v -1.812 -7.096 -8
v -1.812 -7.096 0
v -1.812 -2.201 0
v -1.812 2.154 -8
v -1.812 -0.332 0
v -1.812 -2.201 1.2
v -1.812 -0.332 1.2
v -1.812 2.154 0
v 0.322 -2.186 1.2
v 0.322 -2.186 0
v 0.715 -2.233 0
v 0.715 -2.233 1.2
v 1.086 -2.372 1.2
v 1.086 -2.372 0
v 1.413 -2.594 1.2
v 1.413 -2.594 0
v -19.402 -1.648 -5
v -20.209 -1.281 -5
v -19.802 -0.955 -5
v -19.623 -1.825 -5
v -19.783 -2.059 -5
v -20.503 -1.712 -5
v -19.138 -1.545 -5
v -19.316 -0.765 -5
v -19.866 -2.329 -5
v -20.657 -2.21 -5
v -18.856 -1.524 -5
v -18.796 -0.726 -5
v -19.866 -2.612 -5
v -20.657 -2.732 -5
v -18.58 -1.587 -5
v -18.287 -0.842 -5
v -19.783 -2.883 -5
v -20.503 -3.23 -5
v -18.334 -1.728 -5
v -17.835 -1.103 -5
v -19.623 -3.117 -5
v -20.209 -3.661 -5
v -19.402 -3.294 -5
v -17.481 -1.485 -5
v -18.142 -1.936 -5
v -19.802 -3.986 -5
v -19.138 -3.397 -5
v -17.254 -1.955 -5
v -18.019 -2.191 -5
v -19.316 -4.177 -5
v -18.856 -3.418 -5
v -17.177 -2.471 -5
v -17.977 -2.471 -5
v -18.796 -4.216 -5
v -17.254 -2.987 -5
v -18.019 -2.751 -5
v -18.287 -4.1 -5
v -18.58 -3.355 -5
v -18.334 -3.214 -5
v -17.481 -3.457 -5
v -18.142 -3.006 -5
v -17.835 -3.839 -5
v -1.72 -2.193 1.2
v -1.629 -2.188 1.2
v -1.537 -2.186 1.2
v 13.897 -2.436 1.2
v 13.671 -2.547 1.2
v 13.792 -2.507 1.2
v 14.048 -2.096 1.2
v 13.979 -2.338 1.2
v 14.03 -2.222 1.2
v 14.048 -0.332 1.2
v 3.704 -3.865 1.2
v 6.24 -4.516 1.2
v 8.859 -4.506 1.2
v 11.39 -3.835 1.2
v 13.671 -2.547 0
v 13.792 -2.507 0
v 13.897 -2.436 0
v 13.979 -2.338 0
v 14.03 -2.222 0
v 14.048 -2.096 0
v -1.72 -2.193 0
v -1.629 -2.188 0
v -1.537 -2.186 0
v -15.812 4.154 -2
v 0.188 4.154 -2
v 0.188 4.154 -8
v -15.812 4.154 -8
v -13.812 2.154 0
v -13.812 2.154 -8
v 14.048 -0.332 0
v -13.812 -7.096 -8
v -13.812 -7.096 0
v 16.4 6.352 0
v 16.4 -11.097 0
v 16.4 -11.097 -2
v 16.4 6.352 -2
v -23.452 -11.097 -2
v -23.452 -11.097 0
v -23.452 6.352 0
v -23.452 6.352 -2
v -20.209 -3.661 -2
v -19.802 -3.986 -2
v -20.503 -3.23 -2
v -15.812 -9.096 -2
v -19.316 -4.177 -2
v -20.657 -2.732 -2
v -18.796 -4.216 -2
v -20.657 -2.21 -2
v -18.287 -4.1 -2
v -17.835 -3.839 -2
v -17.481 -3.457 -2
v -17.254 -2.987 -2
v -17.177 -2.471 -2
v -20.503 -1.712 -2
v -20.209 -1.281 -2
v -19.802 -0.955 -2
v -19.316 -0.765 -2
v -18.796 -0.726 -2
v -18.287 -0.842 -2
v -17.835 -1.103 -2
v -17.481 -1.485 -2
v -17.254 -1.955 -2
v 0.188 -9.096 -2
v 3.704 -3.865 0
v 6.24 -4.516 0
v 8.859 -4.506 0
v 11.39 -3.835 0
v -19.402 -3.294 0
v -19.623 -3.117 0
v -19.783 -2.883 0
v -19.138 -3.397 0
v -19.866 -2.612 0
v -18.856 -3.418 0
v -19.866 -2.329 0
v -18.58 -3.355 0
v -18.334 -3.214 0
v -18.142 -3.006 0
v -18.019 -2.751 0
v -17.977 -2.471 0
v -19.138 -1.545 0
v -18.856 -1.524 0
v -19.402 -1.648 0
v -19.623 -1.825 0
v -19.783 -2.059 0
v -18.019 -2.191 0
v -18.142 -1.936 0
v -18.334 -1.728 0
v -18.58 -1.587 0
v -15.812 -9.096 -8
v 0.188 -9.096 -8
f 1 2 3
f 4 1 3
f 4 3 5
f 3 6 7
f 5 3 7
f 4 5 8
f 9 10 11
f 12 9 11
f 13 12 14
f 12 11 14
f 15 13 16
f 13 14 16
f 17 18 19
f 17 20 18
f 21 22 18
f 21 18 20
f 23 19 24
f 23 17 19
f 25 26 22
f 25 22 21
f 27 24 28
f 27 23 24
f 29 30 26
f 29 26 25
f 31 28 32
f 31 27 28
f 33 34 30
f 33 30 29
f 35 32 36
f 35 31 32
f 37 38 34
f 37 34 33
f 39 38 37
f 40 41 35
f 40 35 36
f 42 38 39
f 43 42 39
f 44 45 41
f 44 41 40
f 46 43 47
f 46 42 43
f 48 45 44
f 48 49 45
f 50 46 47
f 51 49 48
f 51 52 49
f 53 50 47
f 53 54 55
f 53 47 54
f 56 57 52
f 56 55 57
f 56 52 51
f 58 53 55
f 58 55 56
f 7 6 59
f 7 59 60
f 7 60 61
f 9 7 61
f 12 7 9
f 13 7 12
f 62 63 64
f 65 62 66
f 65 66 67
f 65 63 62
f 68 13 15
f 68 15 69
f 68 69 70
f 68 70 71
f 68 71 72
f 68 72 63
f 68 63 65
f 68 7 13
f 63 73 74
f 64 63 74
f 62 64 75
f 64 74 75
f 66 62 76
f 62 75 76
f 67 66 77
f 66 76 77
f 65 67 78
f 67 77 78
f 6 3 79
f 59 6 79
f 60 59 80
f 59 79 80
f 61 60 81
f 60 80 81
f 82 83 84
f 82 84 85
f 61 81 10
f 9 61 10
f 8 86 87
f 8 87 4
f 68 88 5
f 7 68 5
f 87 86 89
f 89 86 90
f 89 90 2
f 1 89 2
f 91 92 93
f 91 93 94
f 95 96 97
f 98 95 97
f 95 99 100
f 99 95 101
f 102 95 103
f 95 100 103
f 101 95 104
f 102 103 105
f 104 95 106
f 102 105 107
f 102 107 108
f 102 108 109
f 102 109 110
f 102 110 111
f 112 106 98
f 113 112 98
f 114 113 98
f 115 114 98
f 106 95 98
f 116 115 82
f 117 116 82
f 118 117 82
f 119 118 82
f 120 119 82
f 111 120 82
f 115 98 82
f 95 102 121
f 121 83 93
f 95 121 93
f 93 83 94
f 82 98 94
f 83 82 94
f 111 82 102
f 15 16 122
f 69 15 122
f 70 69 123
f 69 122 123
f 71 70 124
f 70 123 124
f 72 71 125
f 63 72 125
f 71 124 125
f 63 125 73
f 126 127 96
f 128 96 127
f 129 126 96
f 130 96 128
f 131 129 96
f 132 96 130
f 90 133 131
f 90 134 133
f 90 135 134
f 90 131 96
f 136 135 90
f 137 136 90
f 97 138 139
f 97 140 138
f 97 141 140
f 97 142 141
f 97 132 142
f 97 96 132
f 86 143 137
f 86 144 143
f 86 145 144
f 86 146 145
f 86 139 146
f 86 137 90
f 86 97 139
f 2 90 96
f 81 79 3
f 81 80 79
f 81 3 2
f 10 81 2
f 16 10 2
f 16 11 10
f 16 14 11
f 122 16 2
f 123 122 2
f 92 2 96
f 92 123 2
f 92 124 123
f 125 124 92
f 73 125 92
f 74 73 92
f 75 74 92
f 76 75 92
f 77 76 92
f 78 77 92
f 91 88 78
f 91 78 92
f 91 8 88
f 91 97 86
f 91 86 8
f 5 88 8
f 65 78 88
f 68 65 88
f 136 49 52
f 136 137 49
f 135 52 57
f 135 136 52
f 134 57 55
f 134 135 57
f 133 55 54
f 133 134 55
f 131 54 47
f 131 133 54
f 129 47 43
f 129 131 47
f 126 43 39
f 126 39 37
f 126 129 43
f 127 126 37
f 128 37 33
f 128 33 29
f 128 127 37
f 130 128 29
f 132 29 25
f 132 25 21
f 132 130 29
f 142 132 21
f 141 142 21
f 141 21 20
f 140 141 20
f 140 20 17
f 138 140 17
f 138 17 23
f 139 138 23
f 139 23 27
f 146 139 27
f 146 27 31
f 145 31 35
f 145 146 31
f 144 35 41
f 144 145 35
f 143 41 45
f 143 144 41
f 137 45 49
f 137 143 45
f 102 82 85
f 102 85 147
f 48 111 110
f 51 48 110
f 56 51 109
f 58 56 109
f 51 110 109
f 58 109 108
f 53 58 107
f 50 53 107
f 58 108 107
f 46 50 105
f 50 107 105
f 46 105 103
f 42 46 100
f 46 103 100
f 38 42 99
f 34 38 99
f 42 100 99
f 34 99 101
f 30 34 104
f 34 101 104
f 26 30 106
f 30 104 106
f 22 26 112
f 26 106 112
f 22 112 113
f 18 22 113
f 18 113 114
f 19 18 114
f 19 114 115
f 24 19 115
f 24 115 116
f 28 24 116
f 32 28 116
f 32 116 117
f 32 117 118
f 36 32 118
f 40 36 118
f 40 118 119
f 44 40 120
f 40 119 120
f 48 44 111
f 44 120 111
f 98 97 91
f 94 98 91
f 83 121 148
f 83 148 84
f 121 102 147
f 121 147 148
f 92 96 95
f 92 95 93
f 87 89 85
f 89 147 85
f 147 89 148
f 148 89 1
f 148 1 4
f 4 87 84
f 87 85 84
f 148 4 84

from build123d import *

# Parameters (mm, degrees)
F1_W     = 39.8526769131
F1_H     = 17.4496416003
F1_W_2   = 12
F1_H_2   = 2.154154708
F1_H_3   = 0.3318400184
F1_W_3   = 0.2365358905
F1_H_4   = 3.9093678362
F1_W_4   = 2
F2_DEPTH = 2
F3_DEPTH = 8
F4_DEPTH = 1.2
F5_DEPTH = 12.5
F6_R     = 0.95
F7_DEPTH = 8.001
F8_R     = 1.75
F8_R_2   = 0.95
F9_DEPTH = 3


with BuildPart() as f2:
    # F1 (on Top) → F2 (new body)
    with BuildSketch(Plane.XY):
        with Locations((-3.525945358, -2.3725284263)):
            Rectangle(F1_W, F1_H)
        with BuildLine():
            Line((0.3216254651, -2.5177070959), (0.1883759089, -2.5177070959))
            Line((0.1883759089, -2.5177070959), (0.1883759089, -9.095845292))
            Line((0.1883759089, -9.095845292), (-15.8116240911, -9.095845292))
            Line((-15.8116240911, -9.095845292), (-15.8116240911, 4.154154708))
            Line((-15.8116240911, 4.154154708), (0.1883759089, 4.154154708))
            Line((0.1883759089, 4.154154708), (0.1883759089, 0))
            Line((0.1883759089, 0), (14.38, 0))
            Line((14.38, 0), (14.38, -2.0960352984))
            ThreePointArc((14.38, -2.0960352984), (14.222994373, -2.5685374355), (13.8144247375, -2.8531070921))
            ThreePointArc((13.8144247375, -2.8531070921), (7.5097918652, -4.9262625681), (1.2051589929, -2.8531070921))
            ThreePointArc((1.2051589929, -2.8531070921), (0.7941518274, -2.6043780637), (0.3216254651, -2.5177070959))
        make_face(mode=Mode.SUBTRACT)
        with BuildLine():
            Line((-1.8116240911, -2.5356413379), (-1.8116240911, -7.095845292))
            Line((-1.8116240911, -7.095845292), (-13.8116240911, -7.095845292))
            Line((-13.8116240911, -7.095845292), (-13.8116240911, -4.573047873))
            Line((-13.8116240911, -4.573047873), (-14.38, -4.573047873))
            Line((-14.38, -4.573047873), (-14.38, 0))
            Line((-14.38, 0), (-13.8116240911, 0))
            Line((-13.8116240911, 0), (-13.8116240911, 2.154154708))
            Line((-13.8116240911, 2.154154708), (-1.8116240911, 2.154154708))
            Line((-1.8116240911, 2.154154708), (-1.8116240911, 0))
            Line((-1.8116240911, 0), (0.1883759089, 0))
            Line((0.1883759089, 0), (0.1883759089, 4.154154708))
            Line((0.1883759089, 4.154154708), (-15.8116240911, 4.154154708))
            Line((-15.8116240911, 4.154154708), (-15.8116240911, -9.095845292))
            Line((-15.8116240911, -9.095845292), (0.1883759089, -9.095845292))
            Line((0.1883759089, -9.095845292), (0.1883759089, -2.5177070959))
            Line((0.1883759089, -2.5177070959), (-1.5371447255, -2.5177070959))
            ThreePointArc((-1.5371447255, -2.5177070959), (-1.6746770482, -2.5221954315), (-1.8116240911, -2.5356413379))
        make_face()
        with BuildLine():
            Line((14.0481599816, -0.3318400184), (0.1883759089, -0.3318400184))
            Line((0.1883759089, -0.3318400184), (0.1883759089, -2.1858670775))
            Line((0.1883759089, -2.1858670775), (0.3216254651, -2.1858670775))
            ThreePointArc((0.3216254651, -2.1858670775), (0.9044684669, -2.2913304213), (1.4133986427, -2.5943461929))
            ThreePointArc((1.4133986427, -2.5943461929), (7.5498522098, -4.5943445782), (13.6705491966, -2.5466326064))
            ThreePointArc((13.6705491966, -2.5466326064), (13.9412759396, -2.389985906), (14.0481599816, -2.0960352984))
            Line((14.0481599816, -2.0960352984), (14.0481599816, -0.3318400184))
        make_face()
        with BuildLine():
            ThreePointArc((-2.9008357147, -2.6022639059), (-2.3804028006, -2.3361323861), (-1.8116240911, -2.201346691))
            Line((-1.8116240911, -2.201346691), (-1.8116240911, -0.3318400184))
            Line((-1.8116240911, -0.3318400184), (-13.8116240911, -0.3318400184))
            Line((-13.8116240911, -0.3318400184), (-13.8116240911, -4.2412078546))
            Line((-13.8116240911, -4.2412078546), (-4.8014899445, -4.2412078546))
            ThreePointArc((-4.8014899445, -4.2412078546), (-4.372916478, -4.1227433058), (-4.0660275776, -3.8009852162))
            Line((-4.0660275776, -3.8009852162), (-2.9008357147, -2.6022639059))
        make_face()
        with BuildLine():
            Line((-13.8116240911, -7.095845292), (-1.8116240911, -7.095845292))
            Line((-1.8116240911, -7.095845292), (-1.8116240911, -2.5356413379))
            ThreePointArc((-1.8116240911, -2.5356413379), (-2.267834406, -2.6483049616), (-2.687782017, -2.8591720937))
            Line((-2.687782017, -2.8591720937), (-4.1783316179, -4.3926136046))
            ThreePointArc((-4.1783316179, -4.3926136046), (-4.4771125311, -4.5270315227), (-4.8014899445, -4.573047873))
            Line((-4.8014899445, -4.573047873), (-13.8116240911, -4.573047873))
            Line((-13.8116240911, -4.573047873), (-13.8116240911, -7.095845292))
        make_face()
        with Locations((-7.8116240911, 1.077077354)):
            Rectangle(F1_W_2, F1_H_2)
        with BuildLine():
            Line((0.1883759089, -2.1858670775), (0.1883759089, -2.5177070959))
            Line((0.1883759089, -2.5177070959), (0.3216254651, -2.5177070959))
            ThreePointArc((0.3216254651, -2.5177070959), (0.7941518274, -2.6043780637), (1.2051589929, -2.8531070921))
            ThreePointArc((1.2051589929, -2.8531070921), (7.5097918652, -4.9262625681), (13.8144247375, -2.8531070921))
            ThreePointArc((13.8144247375, -2.8531070921), (14.222994373, -2.5685374355), (14.38, -2.0960352984))
            Line((14.38, -2.0960352984), (14.38, 0))
            Line((14.38, 0), (0.1883759089, 0))
            Line((0.1883759089, 0), (0.1883759089, -0.3318400184))
            Line((0.1883759089, -0.3318400184), (14.0481599816, -0.3318400184))
            Line((14.0481599816, -0.3318400184), (14.0481599816, -2.0960352984))
            ThreePointArc((14.0481599816, -2.0960352984), (13.9412759396, -2.389985906), (13.6705491966, -2.5466326064))
            ThreePointArc((13.6705491966, -2.5466326064), (7.5498522098, -4.5943445782), (1.4133986427, -2.5943461929))
            ThreePointArc((1.4133986427, -2.5943461929), (0.9044684669, -2.2913304213), (0.3216254651, -2.1858670775))
            Line((0.3216254651, -2.1858670775), (0.1883759089, -2.1858670775))
        make_face()
        with BuildLine():
            ThreePointArc((-2.687782017, -2.8591720937), (-2.267834406, -2.6483049616), (-1.8116240911, -2.5356413379))
            Line((-1.8116240911, -2.5356413379), (-1.8116240911, -2.201346691))
            ThreePointArc((-1.8116240911, -2.201346691), (-2.3804028006, -2.3361323861), (-2.9008357147, -2.6022639059))
            Line((-2.9008357147, -2.6022639059), (-4.0660275776, -3.8009852162))
            ThreePointArc((-4.0660275776, -3.8009852162), (-4.372916478, -4.1227433058), (-4.8014899445, -4.2412078546))
            Line((-4.8014899445, -4.2412078546), (-13.8116240911, -4.2412078546))
            Line((-13.8116240911, -4.2412078546), (-13.8116240911, -4.573047873))
            Line((-13.8116240911, -4.573047873), (-4.8014899445, -4.573047873))
            ThreePointArc((-4.8014899445, -4.573047873), (-4.4771125311, -4.5270315227), (-4.1783316179, -4.3926136046))
            Line((-4.1783316179, -4.3926136046), (-2.687782017, -2.8591720937))
        make_face()
        with Locations((-7.8116240911, -0.1659200092)):
            Rectangle(F1_W_2, F1_H_3)
        with BuildLine():
            Line((-1.8116240911, -0.3318400184), (-1.8116240911, -2.201346691))
            ThreePointArc((-1.8116240911, -2.201346691), (-1.6746024832, -2.1897400531), (-1.5371447255, -2.1858670775))
            Line((-1.5371447255, -2.1858670775), (0.1883759089, -2.1858670775))
            Line((0.1883759089, -2.1858670775), (0.1883759089, -0.3318400184))
            Line((0.1883759089, -0.3318400184), (-1.8116240911, -0.3318400184))
        make_face()
        Polygon((-14.38, -4.573047873), (-13.8116240911, -4.573047873), (-13.8116240911, -4.2412078546), (-14.0481599816, -4.2412078546), (-14.0481599816, -0.3318400184), (-13.8116240911, -0.3318400184), (-13.8116240911, 0), (-14.38, 0), align=None)
        with Locations((-13.9298920363, -2.2865239365)):
            Rectangle(F1_W_3, F1_H_4)
        with BuildLine():
            Line((-1.8116240911, -2.201346691), (-1.8116240911, -2.5356413379))
            ThreePointArc((-1.8116240911, -2.5356413379), (-1.6746770482, -2.5221954315), (-1.5371447255, -2.5177070959))
            Line((-1.5371447255, -2.5177070959), (0.1883759089, -2.5177070959))
            Line((0.1883759089, -2.5177070959), (0.1883759089, -2.1858670775))
            Line((0.1883759089, -2.1858670775), (-1.5371447255, -2.1858670775))
            ThreePointArc((-1.5371447255, -2.1858670775), (-1.6746024832, -2.1897400531), (-1.8116240911, -2.201346691))
        make_face()
        with Locations((-0.8116240911, -0.1659200092)):
            Rectangle(F1_W_4, F1_H_3)
    extrude(amount=-F2_DEPTH)

    # F1 (on Top) → F3 (join)
    with BuildSketch(Plane.XY):
        with BuildLine():
            Line((-1.8116240911, -2.5356413379), (-1.8116240911, -7.095845292))
            Line((-1.8116240911, -7.095845292), (-13.8116240911, -7.095845292))
            Line((-13.8116240911, -7.095845292), (-13.8116240911, -4.573047873))
            Line((-13.8116240911, -4.573047873), (-14.38, -4.573047873))
            Line((-14.38, -4.573047873), (-14.38, 0))
            Line((-14.38, 0), (-13.8116240911, 0))
            Line((-13.8116240911, 0), (-13.8116240911, 2.154154708))
            Line((-13.8116240911, 2.154154708), (-1.8116240911, 2.154154708))
            Line((-1.8116240911, 2.154154708), (-1.8116240911, 0))
            Line((-1.8116240911, 0), (0.1883759089, 0))
            Line((0.1883759089, 0), (0.1883759089, 4.154154708))
            Line((0.1883759089, 4.154154708), (-15.8116240911, 4.154154708))
            Line((-15.8116240911, 4.154154708), (-15.8116240911, -9.095845292))
            Line((-15.8116240911, -9.095845292), (0.1883759089, -9.095845292))
            Line((0.1883759089, -9.095845292), (0.1883759089, -2.5177070959))
            Line((0.1883759089, -2.5177070959), (-1.5371447255, -2.5177070959))
            ThreePointArc((-1.5371447255, -2.5177070959), (-1.6746770482, -2.5221954315), (-1.8116240911, -2.5356413379))
        make_face()
        with BuildLine():
            ThreePointArc((-2.9008357147, -2.6022639059), (-2.3804028006, -2.3361323861), (-1.8116240911, -2.201346691))
            Line((-1.8116240911, -2.201346691), (-1.8116240911, -0.3318400184))
            Line((-1.8116240911, -0.3318400184), (-13.8116240911, -0.3318400184))
            Line((-13.8116240911, -0.3318400184), (-13.8116240911, -4.2412078546))
            Line((-13.8116240911, -4.2412078546), (-4.8014899445, -4.2412078546))
            ThreePointArc((-4.8014899445, -4.2412078546), (-4.372916478, -4.1227433058), (-4.0660275776, -3.8009852162))
            Line((-4.0660275776, -3.8009852162), (-2.9008357147, -2.6022639059))
        make_face()
        with BuildLine():
            Line((-1.8116240911, -0.3318400184), (-1.8116240911, -2.201346691))
            ThreePointArc((-1.8116240911, -2.201346691), (-1.6746024832, -2.1897400531), (-1.5371447255, -2.1858670775))
            Line((-1.5371447255, -2.1858670775), (0.1883759089, -2.1858670775))
            Line((0.1883759089, -2.1858670775), (0.1883759089, -0.3318400184))
            Line((0.1883759089, -0.3318400184), (-1.8116240911, -0.3318400184))
        make_face()
        with Locations((-0.8116240911, -0.1659200092)):
            Rectangle(F1_W_4, F1_H_3)
        with Locations((-7.8116240911, -0.1659200092)):
            Rectangle(F1_W_2, F1_H_3)
        with Locations((-7.8116240911, 1.077077354)):
            Rectangle(F1_W_2, F1_H_2)
        with BuildLine():
            ThreePointArc((-2.687782017, -2.8591720937), (-2.267834406, -2.6483049616), (-1.8116240911, -2.5356413379))
            Line((-1.8116240911, -2.5356413379), (-1.8116240911, -2.201346691))
            ThreePointArc((-1.8116240911, -2.201346691), (-2.3804028006, -2.3361323861), (-2.9008357147, -2.6022639059))
            Line((-2.9008357147, -2.6022639059), (-4.0660275776, -3.8009852162))
            ThreePointArc((-4.0660275776, -3.8009852162), (-4.372916478, -4.1227433058), (-4.8014899445, -4.2412078546))
            Line((-4.8014899445, -4.2412078546), (-13.8116240911, -4.2412078546))
            Line((-13.8116240911, -4.2412078546), (-13.8116240911, -4.573047873))
            Line((-13.8116240911, -4.573047873), (-4.8014899445, -4.573047873))
            ThreePointArc((-4.8014899445, -4.573047873), (-4.4771125311, -4.5270315227), (-4.1783316179, -4.3926136046))
            Line((-4.1783316179, -4.3926136046), (-2.687782017, -2.8591720937))
        make_face()
        with BuildLine():
            Line((-13.8116240911, -7.095845292), (-1.8116240911, -7.095845292))
            Line((-1.8116240911, -7.095845292), (-1.8116240911, -2.5356413379))
            ThreePointArc((-1.8116240911, -2.5356413379), (-2.267834406, -2.6483049616), (-2.687782017, -2.8591720937))
            Line((-2.687782017, -2.8591720937), (-4.1783316179, -4.3926136046))
            ThreePointArc((-4.1783316179, -4.3926136046), (-4.4771125311, -4.5270315227), (-4.8014899445, -4.573047873))
            Line((-4.8014899445, -4.573047873), (-13.8116240911, -4.573047873))
            Line((-13.8116240911, -4.573047873), (-13.8116240911, -7.095845292))
        make_face()
        with BuildLine():
            Line((-1.8116240911, -2.201346691), (-1.8116240911, -2.5356413379))
            ThreePointArc((-1.8116240911, -2.5356413379), (-1.6746770482, -2.5221954315), (-1.5371447255, -2.5177070959))
            Line((-1.5371447255, -2.5177070959), (0.1883759089, -2.5177070959))
            Line((0.1883759089, -2.5177070959), (0.1883759089, -2.1858670775))
            Line((0.1883759089, -2.1858670775), (-1.5371447255, -2.1858670775))
            ThreePointArc((-1.5371447255, -2.1858670775), (-1.6746024832, -2.1897400531), (-1.8116240911, -2.201346691))
        make_face()
        Polygon((-14.38, -4.573047873), (-13.8116240911, -4.573047873), (-13.8116240911, -4.2412078546), (-14.0481599816, -4.2412078546), (-14.0481599816, -0.3318400184), (-13.8116240911, -0.3318400184), (-13.8116240911, 0), (-14.38, 0), align=None)
        with Locations((-13.9298920363, -2.2865239365)):
            Rectangle(F1_W_3, F1_H_4)
    extrude(amount=-F3_DEPTH)

    # F1 (on Top) → F4 (join)
    with BuildSketch(Plane.XY):
        with BuildLine():
            ThreePointArc((-2.9008357147, -2.6022639059), (-2.3804028006, -2.3361323861), (-1.8116240911, -2.201346691))
            Line((-1.8116240911, -2.201346691), (-1.8116240911, -0.3318400184))
            Line((-1.8116240911, -0.3318400184), (-13.8116240911, -0.3318400184))
            Line((-13.8116240911, -0.3318400184), (-13.8116240911, -4.2412078546))
            Line((-13.8116240911, -4.2412078546), (-4.8014899445, -4.2412078546))
            ThreePointArc((-4.8014899445, -4.2412078546), (-4.372916478, -4.1227433058), (-4.0660275776, -3.8009852162))
            Line((-4.0660275776, -3.8009852162), (-2.9008357147, -2.6022639059))
        make_face()
        with BuildLine():
            Line((-1.8116240911, -0.3318400184), (-1.8116240911, -2.201346691))
            ThreePointArc((-1.8116240911, -2.201346691), (-1.6746024832, -2.1897400531), (-1.5371447255, -2.1858670775))
            Line((-1.5371447255, -2.1858670775), (0.1883759089, -2.1858670775))
            Line((0.1883759089, -2.1858670775), (0.1883759089, -0.3318400184))
            Line((0.1883759089, -0.3318400184), (-1.8116240911, -0.3318400184))
        make_face()
        with BuildLine():
            Line((14.0481599816, -0.3318400184), (0.1883759089, -0.3318400184))
            Line((0.1883759089, -0.3318400184), (0.1883759089, -2.1858670775))
            Line((0.1883759089, -2.1858670775), (0.3216254651, -2.1858670775))
            ThreePointArc((0.3216254651, -2.1858670775), (0.9044684669, -2.2913304213), (1.4133986427, -2.5943461929))
            ThreePointArc((1.4133986427, -2.5943461929), (7.5498522098, -4.5943445782), (13.6705491966, -2.5466326064))
            ThreePointArc((13.6705491966, -2.5466326064), (13.9412759396, -2.389985906), (14.0481599816, -2.0960352984))
            Line((14.0481599816, -2.0960352984), (14.0481599816, -0.3318400184))
        make_face()
    extrude(amount=F4_DEPTH)

    # F1 (on Top) → F5 (cut, symmetric)
    with BuildSketch(Plane.XY):
        with Locations((-7.8116240911, 1.077077354)):
            Rectangle(F1_W_2, F1_H_2)
        with Locations((-7.8116240911, -0.1659200092)):
            Rectangle(F1_W_2, F1_H_3)
        with BuildLine():
            ThreePointArc((-2.9008357147, -2.6022639059), (-2.3804028006, -2.3361323861), (-1.8116240911, -2.201346691))
            Line((-1.8116240911, -2.201346691), (-1.8116240911, -0.3318400184))
            Line((-1.8116240911, -0.3318400184), (-13.8116240911, -0.3318400184))
            Line((-13.8116240911, -0.3318400184), (-13.8116240911, -4.2412078546))
            Line((-13.8116240911, -4.2412078546), (-4.8014899445, -4.2412078546))
            ThreePointArc((-4.8014899445, -4.2412078546), (-4.372916478, -4.1227433058), (-4.0660275776, -3.8009852162))
            Line((-4.0660275776, -3.8009852162), (-2.9008357147, -2.6022639059))
        make_face()
        with BuildLine():
            Line((-13.8116240911, -7.095845292), (-1.8116240911, -7.095845292))
            Line((-1.8116240911, -7.095845292), (-1.8116240911, -2.5356413379))
            ThreePointArc((-1.8116240911, -2.5356413379), (-2.267834406, -2.6483049616), (-2.687782017, -2.8591720937))
            Line((-2.687782017, -2.8591720937), (-4.1783316179, -4.3926136046))
            ThreePointArc((-4.1783316179, -4.3926136046), (-4.4771125311, -4.5270315227), (-4.8014899445, -4.573047873))
            Line((-4.8014899445, -4.573047873), (-13.8116240911, -4.573047873))
            Line((-13.8116240911, -4.573047873), (-13.8116240911, -7.095845292))
        make_face()
        with BuildLine():
            ThreePointArc((-2.687782017, -2.8591720937), (-2.267834406, -2.6483049616), (-1.8116240911, -2.5356413379))
            Line((-1.8116240911, -2.5356413379), (-1.8116240911, -2.201346691))
            ThreePointArc((-1.8116240911, -2.201346691), (-2.3804028006, -2.3361323861), (-2.9008357147, -2.6022639059))
            Line((-2.9008357147, -2.6022639059), (-4.0660275776, -3.8009852162))
            ThreePointArc((-4.0660275776, -3.8009852162), (-4.372916478, -4.1227433058), (-4.8014899445, -4.2412078546))
            Line((-4.8014899445, -4.2412078546), (-13.8116240911, -4.2412078546))
            Line((-13.8116240911, -4.2412078546), (-13.8116240911, -4.573047873))
            Line((-13.8116240911, -4.573047873), (-4.8014899445, -4.573047873))
            ThreePointArc((-4.8014899445, -4.573047873), (-4.4771125311, -4.5270315227), (-4.1783316179, -4.3926136046))
            Line((-4.1783316179, -4.3926136046), (-2.687782017, -2.8591720937))
        make_face()
    extrude(amount=F5_DEPTH, both=True, mode=Mode.SUBTRACT)

    # F6 (on face) → F7 (cut, through all)
    with BuildSketch(Plane.XY):
        with Locations((-18.9266037196, -2.470845292)):
            Circle(F6_R)
    extrude(amount=-F7_DEPTH, mode=Mode.SUBTRACT)

    # F8 (on face) → F9 (join)
    with BuildSketch(Plane(origin=(0, 0, -2), x_dir=(1, 0, 0), z_dir=(0, 0, -1))):
        with Locations((-18.9266037196, 2.470845292)):
            Circle(F8_R)
        with Locations((-18.9266037196, 2.470845292)):
            Circle(F8_R_2, mode=Mode.SUBTRACT)
    extrude(amount=F9_DEPTH)


solid = f2.part
